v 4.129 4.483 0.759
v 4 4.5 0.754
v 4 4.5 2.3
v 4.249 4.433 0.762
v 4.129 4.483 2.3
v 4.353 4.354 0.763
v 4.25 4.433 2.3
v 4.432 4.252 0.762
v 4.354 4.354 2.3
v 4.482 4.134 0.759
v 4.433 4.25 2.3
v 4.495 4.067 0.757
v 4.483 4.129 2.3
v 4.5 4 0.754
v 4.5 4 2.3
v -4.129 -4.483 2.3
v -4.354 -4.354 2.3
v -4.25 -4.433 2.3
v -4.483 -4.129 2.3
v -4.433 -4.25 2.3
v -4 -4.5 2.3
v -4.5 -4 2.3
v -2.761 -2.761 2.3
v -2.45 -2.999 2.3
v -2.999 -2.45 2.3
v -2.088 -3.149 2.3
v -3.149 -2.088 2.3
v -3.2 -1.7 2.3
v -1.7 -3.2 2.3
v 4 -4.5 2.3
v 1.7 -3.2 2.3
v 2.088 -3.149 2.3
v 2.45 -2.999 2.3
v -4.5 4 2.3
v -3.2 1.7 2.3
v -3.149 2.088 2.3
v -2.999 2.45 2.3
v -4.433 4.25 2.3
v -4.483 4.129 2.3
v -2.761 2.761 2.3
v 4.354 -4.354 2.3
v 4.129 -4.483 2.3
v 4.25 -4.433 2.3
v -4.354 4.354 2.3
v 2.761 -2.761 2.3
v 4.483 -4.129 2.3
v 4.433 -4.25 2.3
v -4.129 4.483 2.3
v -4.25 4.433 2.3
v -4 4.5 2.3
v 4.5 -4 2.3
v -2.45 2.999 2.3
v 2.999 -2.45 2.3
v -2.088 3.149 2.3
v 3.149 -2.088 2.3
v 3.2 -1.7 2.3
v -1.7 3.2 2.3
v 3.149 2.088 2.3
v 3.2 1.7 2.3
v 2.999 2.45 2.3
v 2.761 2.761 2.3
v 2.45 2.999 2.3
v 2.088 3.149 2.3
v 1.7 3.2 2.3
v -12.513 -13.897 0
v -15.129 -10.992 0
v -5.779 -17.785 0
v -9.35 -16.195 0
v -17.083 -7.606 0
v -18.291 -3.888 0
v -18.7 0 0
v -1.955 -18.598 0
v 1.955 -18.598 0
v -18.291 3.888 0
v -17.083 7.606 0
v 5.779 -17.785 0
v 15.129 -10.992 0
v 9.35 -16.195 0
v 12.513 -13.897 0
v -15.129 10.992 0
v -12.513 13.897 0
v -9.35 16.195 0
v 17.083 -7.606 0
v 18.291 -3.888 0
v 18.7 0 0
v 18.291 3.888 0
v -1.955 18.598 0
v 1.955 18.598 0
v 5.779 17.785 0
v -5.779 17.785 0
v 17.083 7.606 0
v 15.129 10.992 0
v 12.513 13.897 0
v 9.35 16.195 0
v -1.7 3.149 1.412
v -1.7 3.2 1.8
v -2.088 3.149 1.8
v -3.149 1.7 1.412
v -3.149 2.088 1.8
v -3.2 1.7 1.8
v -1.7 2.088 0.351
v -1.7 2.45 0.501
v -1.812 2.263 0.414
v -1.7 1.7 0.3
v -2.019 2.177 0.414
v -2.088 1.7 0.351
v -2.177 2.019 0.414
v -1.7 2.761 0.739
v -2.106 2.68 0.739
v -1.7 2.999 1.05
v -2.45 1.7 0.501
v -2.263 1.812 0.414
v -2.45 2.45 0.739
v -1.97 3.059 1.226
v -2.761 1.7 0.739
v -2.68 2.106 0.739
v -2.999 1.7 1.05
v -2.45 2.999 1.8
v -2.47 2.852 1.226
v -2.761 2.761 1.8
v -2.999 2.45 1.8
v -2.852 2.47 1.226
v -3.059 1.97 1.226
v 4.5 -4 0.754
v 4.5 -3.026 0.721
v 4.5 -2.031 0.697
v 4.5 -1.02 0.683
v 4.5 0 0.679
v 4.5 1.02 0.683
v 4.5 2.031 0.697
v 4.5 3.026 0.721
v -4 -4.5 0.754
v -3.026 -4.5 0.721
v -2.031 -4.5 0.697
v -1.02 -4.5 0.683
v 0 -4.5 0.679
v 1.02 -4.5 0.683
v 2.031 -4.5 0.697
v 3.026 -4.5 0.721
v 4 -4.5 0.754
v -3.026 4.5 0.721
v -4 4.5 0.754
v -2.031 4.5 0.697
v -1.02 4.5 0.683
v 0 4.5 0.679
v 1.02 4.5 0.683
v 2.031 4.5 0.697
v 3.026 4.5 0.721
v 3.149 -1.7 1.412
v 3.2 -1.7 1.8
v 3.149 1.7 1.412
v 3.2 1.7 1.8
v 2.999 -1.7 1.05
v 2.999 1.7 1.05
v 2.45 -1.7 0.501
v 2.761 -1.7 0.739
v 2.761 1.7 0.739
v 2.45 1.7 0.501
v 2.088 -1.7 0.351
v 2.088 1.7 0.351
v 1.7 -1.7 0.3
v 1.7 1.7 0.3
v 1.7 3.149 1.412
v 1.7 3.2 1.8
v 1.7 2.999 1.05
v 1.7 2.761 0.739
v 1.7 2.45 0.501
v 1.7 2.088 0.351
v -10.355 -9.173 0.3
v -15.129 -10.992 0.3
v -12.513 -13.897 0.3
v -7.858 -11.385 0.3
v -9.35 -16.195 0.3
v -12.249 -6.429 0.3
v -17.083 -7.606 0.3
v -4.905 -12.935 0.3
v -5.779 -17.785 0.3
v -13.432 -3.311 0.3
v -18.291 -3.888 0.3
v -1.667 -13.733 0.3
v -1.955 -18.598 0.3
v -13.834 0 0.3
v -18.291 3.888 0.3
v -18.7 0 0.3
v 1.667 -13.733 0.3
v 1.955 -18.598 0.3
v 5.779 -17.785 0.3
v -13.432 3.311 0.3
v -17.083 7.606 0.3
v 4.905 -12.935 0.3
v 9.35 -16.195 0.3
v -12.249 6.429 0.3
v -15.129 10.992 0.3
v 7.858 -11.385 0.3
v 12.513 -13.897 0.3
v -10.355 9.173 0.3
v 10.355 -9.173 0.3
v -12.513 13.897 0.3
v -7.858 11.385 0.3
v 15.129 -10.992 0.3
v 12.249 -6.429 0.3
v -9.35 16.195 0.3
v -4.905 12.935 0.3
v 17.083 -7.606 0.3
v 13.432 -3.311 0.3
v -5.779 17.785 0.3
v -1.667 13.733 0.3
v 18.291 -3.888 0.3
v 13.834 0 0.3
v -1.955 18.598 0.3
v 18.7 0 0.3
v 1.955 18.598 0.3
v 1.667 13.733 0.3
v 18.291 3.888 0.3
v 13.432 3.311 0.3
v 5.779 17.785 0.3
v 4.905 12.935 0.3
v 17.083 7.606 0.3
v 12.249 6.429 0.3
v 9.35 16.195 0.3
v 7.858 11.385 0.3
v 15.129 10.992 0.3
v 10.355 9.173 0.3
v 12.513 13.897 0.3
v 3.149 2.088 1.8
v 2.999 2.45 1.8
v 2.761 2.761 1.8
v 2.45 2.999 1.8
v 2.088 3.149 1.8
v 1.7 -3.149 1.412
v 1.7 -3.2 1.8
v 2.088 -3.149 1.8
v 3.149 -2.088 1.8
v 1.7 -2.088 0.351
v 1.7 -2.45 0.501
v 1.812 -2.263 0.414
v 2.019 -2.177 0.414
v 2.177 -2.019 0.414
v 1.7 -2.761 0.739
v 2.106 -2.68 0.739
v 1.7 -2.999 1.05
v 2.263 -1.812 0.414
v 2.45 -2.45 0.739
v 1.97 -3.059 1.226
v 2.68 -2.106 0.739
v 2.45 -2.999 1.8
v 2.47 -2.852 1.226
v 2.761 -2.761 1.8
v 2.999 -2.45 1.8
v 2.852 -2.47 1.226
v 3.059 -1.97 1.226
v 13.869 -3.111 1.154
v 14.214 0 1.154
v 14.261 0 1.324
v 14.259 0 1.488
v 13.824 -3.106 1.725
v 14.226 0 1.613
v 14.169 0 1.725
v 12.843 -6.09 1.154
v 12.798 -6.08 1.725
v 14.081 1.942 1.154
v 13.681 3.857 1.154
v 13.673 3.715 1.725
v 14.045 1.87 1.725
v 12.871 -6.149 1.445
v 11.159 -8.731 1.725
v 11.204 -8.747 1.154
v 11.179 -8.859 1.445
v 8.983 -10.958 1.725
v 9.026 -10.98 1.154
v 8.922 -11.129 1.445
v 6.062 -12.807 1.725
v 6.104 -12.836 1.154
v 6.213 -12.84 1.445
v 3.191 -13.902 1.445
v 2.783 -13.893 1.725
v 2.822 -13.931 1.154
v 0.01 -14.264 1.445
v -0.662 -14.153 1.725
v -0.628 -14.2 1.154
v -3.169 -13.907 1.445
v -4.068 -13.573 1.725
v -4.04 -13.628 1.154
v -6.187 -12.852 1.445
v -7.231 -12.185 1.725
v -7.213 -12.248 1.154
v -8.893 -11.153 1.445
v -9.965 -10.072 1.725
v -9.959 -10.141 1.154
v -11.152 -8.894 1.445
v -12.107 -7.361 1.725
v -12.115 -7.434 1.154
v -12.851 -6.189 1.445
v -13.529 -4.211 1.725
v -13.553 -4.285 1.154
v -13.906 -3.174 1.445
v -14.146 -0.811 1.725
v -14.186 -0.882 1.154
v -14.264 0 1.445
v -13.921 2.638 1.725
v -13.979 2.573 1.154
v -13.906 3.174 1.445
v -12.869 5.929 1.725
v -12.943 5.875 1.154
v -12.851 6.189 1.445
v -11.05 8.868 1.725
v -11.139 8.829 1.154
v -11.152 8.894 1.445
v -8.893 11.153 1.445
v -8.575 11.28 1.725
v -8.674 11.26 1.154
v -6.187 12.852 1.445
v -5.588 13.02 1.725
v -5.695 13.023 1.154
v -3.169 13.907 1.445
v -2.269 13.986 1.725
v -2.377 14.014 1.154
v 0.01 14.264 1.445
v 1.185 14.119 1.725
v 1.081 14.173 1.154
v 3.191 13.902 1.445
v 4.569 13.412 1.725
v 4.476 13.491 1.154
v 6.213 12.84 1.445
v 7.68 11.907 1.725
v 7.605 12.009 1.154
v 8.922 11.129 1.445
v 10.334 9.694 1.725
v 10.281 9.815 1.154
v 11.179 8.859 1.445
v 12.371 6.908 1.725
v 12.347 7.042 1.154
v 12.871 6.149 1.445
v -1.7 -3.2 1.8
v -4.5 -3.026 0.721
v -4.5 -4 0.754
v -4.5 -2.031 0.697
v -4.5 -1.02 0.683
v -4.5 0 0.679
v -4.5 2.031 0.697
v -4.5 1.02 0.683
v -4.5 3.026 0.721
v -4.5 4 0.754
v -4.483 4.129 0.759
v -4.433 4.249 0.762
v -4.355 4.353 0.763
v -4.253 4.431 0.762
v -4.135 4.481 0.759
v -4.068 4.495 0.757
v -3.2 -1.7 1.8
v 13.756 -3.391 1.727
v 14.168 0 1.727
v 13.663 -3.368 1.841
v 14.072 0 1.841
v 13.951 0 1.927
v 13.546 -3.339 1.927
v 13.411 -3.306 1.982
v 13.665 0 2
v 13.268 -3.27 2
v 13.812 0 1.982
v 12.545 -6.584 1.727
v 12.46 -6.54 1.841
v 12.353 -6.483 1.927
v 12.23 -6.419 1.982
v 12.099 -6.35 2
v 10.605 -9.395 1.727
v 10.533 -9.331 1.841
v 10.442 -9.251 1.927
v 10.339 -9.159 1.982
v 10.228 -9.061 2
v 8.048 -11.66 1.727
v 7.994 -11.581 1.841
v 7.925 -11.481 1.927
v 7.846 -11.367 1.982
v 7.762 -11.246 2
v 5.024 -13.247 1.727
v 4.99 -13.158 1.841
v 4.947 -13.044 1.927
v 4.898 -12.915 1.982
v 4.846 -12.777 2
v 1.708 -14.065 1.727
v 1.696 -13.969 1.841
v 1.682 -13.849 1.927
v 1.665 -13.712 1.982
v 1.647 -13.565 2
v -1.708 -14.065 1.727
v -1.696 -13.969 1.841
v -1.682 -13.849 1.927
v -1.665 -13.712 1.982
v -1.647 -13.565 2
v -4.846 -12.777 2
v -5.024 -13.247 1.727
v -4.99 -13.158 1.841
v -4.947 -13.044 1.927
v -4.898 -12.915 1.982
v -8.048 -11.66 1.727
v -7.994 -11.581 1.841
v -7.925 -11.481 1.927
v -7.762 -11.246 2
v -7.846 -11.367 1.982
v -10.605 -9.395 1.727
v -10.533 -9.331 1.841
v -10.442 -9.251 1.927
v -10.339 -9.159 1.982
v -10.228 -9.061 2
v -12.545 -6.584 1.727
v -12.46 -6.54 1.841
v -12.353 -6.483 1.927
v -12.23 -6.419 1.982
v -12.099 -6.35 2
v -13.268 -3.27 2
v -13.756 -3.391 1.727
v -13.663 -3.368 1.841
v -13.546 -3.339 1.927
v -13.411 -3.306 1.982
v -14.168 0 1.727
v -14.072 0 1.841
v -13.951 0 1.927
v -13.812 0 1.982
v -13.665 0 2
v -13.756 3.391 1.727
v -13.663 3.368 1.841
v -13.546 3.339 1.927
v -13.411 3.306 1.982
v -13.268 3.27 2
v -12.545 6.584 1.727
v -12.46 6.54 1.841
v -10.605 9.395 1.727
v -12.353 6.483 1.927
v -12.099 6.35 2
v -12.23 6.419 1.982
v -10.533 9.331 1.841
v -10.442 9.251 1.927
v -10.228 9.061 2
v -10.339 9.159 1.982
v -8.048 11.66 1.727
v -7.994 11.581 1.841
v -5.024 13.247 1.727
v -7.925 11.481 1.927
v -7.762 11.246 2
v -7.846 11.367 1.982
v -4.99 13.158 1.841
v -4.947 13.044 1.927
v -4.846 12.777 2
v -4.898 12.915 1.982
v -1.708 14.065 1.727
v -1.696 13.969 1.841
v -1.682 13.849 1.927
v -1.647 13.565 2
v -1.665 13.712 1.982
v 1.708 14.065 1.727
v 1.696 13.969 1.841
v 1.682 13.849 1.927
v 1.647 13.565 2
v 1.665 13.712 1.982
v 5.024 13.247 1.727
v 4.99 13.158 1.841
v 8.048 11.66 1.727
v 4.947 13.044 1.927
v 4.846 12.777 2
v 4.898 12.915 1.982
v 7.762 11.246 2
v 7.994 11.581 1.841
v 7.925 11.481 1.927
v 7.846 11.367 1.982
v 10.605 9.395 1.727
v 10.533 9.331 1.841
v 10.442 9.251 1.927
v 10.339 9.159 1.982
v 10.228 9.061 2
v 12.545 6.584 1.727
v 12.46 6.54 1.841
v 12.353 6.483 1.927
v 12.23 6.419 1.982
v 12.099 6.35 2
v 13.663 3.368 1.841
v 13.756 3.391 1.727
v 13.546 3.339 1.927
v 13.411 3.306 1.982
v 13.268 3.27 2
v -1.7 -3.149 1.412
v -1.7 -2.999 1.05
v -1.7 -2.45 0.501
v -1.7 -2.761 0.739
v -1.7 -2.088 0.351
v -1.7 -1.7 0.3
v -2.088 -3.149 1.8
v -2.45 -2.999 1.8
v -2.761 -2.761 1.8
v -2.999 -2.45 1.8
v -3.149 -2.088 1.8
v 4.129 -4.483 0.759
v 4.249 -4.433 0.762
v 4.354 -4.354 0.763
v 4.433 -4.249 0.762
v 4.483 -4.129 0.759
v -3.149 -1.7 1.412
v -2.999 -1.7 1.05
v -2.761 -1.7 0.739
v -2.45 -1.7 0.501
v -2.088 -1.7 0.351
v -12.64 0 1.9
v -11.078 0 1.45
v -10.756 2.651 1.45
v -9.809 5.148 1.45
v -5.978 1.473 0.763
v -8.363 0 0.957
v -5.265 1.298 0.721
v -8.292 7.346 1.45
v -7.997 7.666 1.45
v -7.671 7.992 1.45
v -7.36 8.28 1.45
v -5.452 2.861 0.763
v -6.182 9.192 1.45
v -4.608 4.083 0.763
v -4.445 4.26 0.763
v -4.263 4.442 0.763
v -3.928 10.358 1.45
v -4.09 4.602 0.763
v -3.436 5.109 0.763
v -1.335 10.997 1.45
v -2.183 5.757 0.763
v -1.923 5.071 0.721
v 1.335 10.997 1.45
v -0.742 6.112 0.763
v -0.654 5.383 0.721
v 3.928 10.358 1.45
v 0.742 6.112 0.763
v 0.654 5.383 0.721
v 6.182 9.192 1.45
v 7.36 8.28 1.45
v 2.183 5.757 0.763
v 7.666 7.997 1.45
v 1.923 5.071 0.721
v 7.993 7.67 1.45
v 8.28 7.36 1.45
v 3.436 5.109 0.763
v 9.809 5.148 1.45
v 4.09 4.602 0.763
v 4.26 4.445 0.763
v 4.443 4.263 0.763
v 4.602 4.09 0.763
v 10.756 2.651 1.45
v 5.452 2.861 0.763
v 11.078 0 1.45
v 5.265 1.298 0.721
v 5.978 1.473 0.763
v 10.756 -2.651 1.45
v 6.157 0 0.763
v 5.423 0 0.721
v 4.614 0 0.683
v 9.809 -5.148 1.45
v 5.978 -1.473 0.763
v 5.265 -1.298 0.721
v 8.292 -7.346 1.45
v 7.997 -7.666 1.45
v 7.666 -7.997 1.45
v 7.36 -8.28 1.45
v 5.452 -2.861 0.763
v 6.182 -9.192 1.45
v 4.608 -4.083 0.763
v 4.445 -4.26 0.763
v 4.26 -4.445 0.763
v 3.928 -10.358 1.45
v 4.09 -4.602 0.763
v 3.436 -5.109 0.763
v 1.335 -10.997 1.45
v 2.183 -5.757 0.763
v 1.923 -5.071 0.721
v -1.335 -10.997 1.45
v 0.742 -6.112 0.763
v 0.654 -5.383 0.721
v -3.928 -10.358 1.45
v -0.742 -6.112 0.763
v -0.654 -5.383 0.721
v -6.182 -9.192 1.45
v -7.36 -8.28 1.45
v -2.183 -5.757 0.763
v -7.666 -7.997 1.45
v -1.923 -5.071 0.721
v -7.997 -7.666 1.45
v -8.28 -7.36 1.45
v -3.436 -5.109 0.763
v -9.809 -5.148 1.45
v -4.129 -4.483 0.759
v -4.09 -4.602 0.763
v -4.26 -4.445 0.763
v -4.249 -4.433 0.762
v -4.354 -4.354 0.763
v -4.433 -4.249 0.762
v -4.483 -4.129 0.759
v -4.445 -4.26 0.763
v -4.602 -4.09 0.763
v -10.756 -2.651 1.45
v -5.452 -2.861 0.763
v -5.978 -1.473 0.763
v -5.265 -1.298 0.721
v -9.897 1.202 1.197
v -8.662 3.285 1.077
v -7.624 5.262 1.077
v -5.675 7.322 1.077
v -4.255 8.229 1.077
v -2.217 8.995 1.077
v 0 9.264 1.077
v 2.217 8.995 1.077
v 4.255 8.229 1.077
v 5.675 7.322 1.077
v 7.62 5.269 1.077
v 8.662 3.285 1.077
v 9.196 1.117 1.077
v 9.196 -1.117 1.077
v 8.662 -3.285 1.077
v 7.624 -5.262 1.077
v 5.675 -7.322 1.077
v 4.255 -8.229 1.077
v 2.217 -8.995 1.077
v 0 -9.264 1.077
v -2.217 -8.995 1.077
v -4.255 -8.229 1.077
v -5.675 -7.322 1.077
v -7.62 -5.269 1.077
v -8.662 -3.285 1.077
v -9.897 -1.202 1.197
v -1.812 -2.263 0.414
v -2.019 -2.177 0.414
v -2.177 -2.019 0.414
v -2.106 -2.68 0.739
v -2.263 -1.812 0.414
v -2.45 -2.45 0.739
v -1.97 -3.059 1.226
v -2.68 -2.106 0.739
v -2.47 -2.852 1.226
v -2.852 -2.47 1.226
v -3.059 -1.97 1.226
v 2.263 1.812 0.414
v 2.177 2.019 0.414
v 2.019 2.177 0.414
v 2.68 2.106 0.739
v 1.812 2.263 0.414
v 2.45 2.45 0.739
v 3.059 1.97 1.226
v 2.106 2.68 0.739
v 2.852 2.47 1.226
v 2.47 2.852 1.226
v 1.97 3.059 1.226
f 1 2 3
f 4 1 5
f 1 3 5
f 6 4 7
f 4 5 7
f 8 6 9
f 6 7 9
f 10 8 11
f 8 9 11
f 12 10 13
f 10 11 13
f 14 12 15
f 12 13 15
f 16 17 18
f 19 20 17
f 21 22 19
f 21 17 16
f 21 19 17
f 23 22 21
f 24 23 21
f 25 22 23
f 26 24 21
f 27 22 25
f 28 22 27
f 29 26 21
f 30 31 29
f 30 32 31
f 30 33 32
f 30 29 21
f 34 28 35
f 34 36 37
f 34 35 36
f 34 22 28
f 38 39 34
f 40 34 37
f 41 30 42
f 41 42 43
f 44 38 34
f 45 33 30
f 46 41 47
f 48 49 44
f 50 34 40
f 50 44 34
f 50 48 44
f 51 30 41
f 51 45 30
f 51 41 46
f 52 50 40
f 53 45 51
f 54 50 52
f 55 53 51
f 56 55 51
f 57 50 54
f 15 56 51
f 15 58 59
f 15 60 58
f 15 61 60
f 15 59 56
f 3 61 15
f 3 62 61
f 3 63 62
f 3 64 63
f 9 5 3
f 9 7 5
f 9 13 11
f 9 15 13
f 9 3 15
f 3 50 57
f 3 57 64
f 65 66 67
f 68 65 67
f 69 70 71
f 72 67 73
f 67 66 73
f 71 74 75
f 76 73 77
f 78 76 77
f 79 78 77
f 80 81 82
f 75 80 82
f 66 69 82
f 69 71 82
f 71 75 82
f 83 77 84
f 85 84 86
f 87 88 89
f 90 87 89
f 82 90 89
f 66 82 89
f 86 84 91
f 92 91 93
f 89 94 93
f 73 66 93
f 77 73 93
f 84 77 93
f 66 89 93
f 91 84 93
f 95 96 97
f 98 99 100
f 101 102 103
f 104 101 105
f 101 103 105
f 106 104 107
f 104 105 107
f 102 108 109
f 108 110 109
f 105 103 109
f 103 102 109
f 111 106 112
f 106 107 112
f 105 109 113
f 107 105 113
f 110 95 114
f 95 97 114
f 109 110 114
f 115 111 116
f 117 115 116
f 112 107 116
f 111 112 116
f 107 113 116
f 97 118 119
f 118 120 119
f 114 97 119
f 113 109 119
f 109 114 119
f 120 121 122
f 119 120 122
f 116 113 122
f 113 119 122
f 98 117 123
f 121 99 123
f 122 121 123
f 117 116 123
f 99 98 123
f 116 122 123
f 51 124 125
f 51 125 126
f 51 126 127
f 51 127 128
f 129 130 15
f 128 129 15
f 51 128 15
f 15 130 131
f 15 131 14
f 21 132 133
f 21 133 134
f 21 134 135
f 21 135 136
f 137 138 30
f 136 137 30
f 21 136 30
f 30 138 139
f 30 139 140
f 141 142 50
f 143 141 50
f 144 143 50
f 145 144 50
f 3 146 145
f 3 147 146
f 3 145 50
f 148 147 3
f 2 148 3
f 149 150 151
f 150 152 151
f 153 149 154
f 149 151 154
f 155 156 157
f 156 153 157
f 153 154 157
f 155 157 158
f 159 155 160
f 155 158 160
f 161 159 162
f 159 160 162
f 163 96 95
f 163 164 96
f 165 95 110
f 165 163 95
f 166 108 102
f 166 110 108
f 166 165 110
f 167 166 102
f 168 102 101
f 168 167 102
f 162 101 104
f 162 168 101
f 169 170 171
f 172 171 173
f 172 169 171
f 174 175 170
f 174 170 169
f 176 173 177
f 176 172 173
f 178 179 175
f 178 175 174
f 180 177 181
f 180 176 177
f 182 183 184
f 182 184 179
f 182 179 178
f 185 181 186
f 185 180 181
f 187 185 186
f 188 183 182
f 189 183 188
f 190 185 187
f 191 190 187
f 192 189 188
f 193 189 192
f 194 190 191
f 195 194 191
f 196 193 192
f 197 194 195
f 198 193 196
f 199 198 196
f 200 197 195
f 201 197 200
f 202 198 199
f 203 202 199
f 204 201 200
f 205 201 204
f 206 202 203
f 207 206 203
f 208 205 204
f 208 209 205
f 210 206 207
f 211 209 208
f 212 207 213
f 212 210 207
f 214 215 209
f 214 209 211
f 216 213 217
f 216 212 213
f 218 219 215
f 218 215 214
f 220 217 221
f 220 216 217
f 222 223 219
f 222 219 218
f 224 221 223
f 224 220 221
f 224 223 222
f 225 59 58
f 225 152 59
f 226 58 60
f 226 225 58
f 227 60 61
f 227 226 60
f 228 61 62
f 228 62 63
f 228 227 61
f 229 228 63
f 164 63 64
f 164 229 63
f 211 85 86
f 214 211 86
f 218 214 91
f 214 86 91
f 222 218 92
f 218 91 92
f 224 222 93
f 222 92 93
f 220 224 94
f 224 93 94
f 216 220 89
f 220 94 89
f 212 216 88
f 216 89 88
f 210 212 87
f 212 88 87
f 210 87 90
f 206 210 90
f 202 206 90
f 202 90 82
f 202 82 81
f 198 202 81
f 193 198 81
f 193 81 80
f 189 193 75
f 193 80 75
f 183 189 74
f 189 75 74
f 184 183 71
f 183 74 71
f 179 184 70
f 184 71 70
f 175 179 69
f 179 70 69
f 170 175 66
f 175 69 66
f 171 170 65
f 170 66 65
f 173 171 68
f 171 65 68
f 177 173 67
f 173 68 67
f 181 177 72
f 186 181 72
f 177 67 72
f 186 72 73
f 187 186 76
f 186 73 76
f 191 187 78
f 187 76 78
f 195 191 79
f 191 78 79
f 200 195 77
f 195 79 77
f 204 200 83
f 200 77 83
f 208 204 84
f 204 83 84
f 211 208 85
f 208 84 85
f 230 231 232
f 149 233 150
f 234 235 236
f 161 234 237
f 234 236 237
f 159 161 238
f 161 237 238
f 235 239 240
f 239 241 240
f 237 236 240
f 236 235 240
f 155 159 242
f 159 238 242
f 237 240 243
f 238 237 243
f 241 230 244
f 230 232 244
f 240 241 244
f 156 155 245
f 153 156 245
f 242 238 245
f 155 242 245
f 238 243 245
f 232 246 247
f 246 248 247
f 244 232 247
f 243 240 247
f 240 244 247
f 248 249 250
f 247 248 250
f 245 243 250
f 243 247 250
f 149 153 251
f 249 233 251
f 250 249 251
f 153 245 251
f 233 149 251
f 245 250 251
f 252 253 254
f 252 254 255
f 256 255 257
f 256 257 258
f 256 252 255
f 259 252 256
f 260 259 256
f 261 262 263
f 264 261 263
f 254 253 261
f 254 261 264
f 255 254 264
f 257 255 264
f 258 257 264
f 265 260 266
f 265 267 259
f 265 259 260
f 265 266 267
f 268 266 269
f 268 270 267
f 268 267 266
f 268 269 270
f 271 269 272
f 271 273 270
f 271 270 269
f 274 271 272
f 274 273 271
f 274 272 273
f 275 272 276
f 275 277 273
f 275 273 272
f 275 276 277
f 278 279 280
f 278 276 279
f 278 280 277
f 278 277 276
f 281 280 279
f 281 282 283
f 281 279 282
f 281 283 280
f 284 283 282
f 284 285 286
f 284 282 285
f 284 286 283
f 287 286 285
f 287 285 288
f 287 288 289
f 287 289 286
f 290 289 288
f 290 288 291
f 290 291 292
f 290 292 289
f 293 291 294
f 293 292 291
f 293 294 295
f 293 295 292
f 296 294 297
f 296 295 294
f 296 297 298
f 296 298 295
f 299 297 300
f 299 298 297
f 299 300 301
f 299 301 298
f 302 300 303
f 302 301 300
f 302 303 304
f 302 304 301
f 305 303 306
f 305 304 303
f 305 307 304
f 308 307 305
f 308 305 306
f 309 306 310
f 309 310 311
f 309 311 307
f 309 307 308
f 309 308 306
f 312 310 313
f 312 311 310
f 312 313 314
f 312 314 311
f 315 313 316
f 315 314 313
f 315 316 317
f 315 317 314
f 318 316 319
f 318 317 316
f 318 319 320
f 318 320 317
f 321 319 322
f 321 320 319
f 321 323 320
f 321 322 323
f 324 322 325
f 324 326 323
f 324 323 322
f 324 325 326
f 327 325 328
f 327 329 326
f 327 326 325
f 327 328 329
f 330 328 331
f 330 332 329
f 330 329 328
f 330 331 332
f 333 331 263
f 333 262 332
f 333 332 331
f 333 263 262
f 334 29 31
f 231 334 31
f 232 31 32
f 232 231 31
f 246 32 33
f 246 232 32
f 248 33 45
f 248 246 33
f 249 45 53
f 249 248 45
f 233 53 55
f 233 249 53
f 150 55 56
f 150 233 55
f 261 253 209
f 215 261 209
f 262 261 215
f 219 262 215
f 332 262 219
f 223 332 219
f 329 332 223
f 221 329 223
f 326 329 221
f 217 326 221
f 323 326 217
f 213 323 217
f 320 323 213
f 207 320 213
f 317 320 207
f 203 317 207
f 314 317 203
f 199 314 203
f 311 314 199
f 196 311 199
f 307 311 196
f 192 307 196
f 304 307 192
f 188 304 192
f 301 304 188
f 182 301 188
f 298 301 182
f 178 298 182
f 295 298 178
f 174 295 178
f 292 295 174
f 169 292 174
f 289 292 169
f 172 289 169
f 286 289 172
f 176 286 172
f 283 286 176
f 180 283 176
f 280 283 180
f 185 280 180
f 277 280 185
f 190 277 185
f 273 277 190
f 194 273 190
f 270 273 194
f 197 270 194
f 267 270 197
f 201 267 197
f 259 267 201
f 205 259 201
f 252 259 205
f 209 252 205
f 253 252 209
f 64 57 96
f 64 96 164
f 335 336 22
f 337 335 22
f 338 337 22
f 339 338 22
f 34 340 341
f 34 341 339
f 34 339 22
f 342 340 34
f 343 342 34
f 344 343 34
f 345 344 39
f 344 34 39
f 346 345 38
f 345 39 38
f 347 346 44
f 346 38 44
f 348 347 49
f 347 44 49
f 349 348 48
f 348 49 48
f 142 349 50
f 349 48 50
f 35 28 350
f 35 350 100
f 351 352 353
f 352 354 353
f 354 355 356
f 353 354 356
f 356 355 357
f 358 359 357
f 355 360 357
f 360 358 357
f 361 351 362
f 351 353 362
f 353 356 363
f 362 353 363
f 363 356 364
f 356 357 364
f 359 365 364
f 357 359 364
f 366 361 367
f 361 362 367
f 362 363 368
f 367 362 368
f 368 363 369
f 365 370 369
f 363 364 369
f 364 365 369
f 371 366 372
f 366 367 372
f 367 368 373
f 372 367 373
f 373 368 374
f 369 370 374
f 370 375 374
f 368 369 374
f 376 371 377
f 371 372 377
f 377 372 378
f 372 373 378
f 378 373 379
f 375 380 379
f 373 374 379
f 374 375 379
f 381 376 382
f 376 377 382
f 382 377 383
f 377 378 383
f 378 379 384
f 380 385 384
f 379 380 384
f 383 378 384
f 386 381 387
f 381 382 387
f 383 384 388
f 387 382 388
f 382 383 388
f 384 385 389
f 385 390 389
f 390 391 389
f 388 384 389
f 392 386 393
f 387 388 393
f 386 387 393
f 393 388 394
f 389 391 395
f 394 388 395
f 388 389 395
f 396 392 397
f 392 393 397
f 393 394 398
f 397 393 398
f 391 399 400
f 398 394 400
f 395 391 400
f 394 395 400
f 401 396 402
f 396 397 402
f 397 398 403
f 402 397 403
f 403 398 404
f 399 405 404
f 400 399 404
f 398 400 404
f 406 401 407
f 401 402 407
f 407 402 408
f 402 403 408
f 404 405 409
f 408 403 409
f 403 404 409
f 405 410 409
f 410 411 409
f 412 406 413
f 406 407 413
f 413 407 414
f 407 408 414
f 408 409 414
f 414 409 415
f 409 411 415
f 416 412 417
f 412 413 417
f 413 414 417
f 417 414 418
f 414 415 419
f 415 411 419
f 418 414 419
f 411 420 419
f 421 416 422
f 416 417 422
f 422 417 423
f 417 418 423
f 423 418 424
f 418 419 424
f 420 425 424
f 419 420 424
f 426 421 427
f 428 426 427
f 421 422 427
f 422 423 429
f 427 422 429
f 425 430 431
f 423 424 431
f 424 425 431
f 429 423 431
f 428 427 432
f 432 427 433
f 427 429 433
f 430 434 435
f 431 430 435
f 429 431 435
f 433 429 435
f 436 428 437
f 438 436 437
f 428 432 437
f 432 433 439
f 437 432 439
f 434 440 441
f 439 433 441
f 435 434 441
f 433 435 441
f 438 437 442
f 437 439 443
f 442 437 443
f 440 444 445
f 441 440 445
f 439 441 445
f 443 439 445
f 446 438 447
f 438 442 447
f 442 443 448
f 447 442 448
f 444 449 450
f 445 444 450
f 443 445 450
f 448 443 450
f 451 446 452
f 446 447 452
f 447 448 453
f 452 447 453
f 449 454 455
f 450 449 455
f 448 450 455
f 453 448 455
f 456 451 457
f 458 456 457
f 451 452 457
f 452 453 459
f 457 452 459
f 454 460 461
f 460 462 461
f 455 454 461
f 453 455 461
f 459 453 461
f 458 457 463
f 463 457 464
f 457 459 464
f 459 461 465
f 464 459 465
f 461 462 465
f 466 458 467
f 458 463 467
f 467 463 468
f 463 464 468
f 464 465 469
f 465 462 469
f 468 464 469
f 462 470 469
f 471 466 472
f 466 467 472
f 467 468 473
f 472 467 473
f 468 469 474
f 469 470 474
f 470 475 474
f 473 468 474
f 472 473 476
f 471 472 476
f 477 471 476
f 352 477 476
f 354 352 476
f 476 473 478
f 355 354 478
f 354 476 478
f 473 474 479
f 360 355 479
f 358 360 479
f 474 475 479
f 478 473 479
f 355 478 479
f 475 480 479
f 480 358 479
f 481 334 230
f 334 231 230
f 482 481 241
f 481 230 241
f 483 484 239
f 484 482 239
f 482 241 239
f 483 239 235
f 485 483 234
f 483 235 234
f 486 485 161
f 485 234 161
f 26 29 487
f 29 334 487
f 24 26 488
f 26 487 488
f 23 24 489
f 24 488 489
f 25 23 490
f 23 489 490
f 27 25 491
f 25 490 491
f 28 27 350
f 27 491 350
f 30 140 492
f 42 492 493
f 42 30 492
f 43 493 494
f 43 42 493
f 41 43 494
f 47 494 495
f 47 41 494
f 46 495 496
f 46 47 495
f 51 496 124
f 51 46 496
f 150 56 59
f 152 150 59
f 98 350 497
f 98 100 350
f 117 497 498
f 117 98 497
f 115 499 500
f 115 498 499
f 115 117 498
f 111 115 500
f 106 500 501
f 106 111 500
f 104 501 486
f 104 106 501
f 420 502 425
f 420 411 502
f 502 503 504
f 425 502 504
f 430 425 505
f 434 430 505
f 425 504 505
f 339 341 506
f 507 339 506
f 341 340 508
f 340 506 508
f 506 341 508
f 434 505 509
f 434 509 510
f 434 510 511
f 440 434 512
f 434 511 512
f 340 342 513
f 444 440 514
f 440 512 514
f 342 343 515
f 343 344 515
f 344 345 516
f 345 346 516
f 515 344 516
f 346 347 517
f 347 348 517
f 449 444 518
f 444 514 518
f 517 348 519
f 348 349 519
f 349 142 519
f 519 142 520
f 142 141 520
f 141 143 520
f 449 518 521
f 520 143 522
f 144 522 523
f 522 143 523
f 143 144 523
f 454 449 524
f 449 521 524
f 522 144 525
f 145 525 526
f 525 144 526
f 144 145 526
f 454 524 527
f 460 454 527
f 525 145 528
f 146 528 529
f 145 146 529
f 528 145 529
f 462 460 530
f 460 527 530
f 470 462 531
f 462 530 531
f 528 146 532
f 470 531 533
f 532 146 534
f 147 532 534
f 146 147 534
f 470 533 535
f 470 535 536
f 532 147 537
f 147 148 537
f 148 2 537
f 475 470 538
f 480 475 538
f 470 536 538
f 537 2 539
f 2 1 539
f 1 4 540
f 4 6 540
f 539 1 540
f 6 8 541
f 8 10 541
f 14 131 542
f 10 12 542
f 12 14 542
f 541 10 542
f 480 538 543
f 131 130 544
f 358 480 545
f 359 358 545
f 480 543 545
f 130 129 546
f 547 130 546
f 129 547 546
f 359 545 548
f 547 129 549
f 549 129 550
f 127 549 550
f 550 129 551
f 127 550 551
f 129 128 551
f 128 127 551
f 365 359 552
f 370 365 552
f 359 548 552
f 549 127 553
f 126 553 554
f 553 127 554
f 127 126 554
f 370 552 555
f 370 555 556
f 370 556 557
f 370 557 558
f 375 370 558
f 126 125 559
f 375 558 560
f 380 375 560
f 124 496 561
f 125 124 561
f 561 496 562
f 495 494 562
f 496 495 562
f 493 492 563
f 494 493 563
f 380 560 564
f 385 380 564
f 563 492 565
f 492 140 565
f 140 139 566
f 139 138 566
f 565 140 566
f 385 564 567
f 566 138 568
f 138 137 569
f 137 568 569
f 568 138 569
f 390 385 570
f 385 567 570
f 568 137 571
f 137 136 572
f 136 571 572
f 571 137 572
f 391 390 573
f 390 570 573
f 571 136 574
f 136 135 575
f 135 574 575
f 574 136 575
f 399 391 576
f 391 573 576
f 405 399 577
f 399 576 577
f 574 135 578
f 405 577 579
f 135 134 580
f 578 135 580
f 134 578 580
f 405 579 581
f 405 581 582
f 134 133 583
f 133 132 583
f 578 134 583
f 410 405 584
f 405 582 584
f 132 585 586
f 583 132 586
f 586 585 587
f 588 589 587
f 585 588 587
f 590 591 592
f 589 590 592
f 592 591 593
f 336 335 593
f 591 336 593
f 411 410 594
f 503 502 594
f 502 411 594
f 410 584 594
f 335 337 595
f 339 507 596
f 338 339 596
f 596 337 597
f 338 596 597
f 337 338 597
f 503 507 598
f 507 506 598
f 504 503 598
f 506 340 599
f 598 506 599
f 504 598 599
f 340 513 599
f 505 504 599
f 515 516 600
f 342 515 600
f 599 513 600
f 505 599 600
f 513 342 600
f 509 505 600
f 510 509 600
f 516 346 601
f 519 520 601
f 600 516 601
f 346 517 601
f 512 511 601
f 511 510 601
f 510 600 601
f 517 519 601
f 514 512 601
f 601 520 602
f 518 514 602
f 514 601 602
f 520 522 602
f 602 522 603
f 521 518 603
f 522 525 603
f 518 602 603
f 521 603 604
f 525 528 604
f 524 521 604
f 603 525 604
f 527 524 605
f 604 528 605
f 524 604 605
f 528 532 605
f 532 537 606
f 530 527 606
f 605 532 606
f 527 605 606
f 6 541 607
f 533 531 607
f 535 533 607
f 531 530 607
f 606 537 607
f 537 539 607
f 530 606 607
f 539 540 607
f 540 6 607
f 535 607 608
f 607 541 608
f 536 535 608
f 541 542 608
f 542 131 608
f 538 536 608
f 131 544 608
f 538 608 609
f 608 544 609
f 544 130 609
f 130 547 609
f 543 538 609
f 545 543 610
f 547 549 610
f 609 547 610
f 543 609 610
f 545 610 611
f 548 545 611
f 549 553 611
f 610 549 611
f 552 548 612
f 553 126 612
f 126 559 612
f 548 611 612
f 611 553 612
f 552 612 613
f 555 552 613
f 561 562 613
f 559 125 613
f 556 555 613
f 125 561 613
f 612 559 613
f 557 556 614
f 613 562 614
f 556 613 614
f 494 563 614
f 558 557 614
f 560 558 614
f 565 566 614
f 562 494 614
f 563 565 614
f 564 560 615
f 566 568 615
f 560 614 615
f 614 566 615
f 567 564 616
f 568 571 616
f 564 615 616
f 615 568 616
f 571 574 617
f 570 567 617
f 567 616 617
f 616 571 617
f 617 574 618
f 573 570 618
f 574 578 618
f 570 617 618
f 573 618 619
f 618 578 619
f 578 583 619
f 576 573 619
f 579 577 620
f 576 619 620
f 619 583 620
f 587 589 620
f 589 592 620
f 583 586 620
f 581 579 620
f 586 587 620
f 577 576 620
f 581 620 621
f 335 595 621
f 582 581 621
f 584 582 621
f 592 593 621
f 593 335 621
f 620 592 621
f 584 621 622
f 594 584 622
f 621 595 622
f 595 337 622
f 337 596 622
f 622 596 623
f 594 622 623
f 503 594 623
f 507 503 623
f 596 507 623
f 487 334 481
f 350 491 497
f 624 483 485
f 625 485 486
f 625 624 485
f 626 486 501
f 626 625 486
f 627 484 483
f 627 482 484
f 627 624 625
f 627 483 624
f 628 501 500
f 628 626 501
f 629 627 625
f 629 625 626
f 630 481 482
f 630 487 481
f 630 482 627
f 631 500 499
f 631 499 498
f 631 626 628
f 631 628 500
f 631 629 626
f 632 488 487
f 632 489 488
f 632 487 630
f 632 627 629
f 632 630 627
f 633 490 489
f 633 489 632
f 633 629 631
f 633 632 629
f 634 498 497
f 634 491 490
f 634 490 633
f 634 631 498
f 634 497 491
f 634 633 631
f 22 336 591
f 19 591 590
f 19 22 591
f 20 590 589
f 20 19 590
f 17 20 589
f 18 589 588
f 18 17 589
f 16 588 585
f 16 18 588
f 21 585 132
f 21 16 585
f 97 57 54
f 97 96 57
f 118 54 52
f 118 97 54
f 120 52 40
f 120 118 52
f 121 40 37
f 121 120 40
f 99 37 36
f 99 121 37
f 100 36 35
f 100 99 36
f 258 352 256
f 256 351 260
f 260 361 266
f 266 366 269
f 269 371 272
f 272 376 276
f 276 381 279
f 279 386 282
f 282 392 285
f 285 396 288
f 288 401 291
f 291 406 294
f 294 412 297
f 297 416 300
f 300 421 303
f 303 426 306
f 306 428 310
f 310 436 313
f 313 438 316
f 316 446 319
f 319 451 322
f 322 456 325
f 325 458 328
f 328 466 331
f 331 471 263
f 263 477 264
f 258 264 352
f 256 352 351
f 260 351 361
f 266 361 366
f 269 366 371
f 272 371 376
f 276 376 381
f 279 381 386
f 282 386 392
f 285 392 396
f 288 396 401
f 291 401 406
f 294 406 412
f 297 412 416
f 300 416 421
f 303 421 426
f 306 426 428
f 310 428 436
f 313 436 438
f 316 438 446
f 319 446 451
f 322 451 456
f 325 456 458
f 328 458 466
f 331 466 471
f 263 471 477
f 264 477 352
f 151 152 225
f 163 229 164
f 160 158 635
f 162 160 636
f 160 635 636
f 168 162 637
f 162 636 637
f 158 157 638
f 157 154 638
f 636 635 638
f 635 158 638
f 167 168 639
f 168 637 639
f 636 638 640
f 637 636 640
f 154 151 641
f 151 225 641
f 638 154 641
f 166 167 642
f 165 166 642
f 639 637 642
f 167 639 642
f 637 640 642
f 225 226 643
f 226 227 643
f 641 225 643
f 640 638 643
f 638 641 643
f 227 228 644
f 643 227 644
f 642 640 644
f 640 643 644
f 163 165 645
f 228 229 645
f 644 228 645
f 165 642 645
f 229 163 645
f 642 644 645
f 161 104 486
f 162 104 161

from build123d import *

# Parameters (mm, degrees)
F0_R      = 18.7
F0_R_2    = 13.7
F1_DEPTH  = 0.3
F2_DEPTH  = 2
F2_TAPER  = -24
F4_R      = 0.6
F8_W      = 9
F8_H      = 9
F9_DEPTH  = 2
F10_R     = 0.5
F11_W     = 6.4
F11_H     = 6.4
F12_DEPTH = 2
F13_R     = 1.5


# Not quite as in the source:
# - a fillet or chamfer that OpenCascade refuses, or shapes differently, is made with other operations: its cross-section is extruded or revolved along the edge and cut away or added


with BuildPart() as f1:
    # F0 (on Top) → F1 (new body)
    with BuildSketch(Plane.XY):
        Circle(F0_R)
        Circle(F0_R_2, mode=Mode.SUBTRACT)
        Circle(F0_R_2)
    extrude(amount=F1_DEPTH)

    # F0 (on Top) → F2 (join)
    with BuildSketch(Plane.XY):
        Circle(F0_R_2)
    extrude(amount=F2_DEPTH, taper=F2_TAPER)

    # F3: chamfer of 0.6 on 1 edges, made by hand

    # F3_s1 → F3_t2 (revolve, cut)
    with BuildSketch(Plane.XZ):
        Polygon((14.3464153848, 1.4518727254), (13.9904573706, 2), (14.5904573706, 2), align=None)
    revolve(axis=Axis((0, 0, 2), (0, 0, -1)), mode=Mode.SUBTRACT)

    # F4
    f4_edges = [f1.edges().sort_by_distance(p)[0] for p in [
        (-14.346415, 0, 1.451873),
        (-13.990457, 0, 2),
    ]]
    fillet(f4_edges, radius=F4_R)


with BuildPart() as f6:
    # F5 (on Front) → F6 (revolve)
    with BuildSketch(Plane.XZ):
        with BuildLine():
            Line((0, 2), (-13.6646839508, 2))
            add(Edge.make_bspline(
                [(-13.6646839508, 2), (-11.1315483197, 2), (-12.2314980254, 0.6), (0, 0.6)],
                knots=[0, 0, 0, 0, 13.7362144522, 13.7362144522, 13.7362144522, 13.7362144522], degree=3))
            Line((0, 0.6), (0, 2))
        make_face()
    revolve(axis=Axis((0, 0, 1.3), (0, 0, -1)))


with BuildPart() as f1_1:
    add(f1.part)

    # F7: cut F6
    add(f6.part, mode=Mode.SUBTRACT)

    # F8 (on face) → F9 (join)
    with BuildSketch(Plane.XY.offset(0.3)):
        Rectangle(F8_W, F8_H)
    extrude(amount=F9_DEPTH)

    # F10
    f10_edges = [f1_1.edges().sort_by_distance(p)[0] for p in [
        (-4.5, 4.5, 1.538289),
        (-4.5, -4.5, 1.538289),
        (4.5, -4.5, 1.538289),
        (4.5, 4.5, 1.538289),
    ]]
    fillet(f10_edges, radius=F10_R)

    # F11 (on face) → F12 (cut, through all)
    with BuildSketch(Plane.XY.offset(2.3)):
        Rectangle(F11_W, F11_H)
    extrude(amount=-F12_DEPTH, mode=Mode.SUBTRACT)

    # F13
    f13_edges = [f1_1.edges().sort_by_distance(p)[0] for p in [
        (-3.2, 3.2, 1.3),
        (3.2, 3.2, 1.3),
        (3.2, -3.2, 1.3),
        (-3.2, -3.2, 1.3),
        (0, -3.2, 0.3),
        (3.2, 0, 0.3),
        (0, 3.2, 0.3),
        (-3.2, 0, 0.3),
    ]]
    fillet(f13_edges, radius=F13_R)


solid = f1_1.part
